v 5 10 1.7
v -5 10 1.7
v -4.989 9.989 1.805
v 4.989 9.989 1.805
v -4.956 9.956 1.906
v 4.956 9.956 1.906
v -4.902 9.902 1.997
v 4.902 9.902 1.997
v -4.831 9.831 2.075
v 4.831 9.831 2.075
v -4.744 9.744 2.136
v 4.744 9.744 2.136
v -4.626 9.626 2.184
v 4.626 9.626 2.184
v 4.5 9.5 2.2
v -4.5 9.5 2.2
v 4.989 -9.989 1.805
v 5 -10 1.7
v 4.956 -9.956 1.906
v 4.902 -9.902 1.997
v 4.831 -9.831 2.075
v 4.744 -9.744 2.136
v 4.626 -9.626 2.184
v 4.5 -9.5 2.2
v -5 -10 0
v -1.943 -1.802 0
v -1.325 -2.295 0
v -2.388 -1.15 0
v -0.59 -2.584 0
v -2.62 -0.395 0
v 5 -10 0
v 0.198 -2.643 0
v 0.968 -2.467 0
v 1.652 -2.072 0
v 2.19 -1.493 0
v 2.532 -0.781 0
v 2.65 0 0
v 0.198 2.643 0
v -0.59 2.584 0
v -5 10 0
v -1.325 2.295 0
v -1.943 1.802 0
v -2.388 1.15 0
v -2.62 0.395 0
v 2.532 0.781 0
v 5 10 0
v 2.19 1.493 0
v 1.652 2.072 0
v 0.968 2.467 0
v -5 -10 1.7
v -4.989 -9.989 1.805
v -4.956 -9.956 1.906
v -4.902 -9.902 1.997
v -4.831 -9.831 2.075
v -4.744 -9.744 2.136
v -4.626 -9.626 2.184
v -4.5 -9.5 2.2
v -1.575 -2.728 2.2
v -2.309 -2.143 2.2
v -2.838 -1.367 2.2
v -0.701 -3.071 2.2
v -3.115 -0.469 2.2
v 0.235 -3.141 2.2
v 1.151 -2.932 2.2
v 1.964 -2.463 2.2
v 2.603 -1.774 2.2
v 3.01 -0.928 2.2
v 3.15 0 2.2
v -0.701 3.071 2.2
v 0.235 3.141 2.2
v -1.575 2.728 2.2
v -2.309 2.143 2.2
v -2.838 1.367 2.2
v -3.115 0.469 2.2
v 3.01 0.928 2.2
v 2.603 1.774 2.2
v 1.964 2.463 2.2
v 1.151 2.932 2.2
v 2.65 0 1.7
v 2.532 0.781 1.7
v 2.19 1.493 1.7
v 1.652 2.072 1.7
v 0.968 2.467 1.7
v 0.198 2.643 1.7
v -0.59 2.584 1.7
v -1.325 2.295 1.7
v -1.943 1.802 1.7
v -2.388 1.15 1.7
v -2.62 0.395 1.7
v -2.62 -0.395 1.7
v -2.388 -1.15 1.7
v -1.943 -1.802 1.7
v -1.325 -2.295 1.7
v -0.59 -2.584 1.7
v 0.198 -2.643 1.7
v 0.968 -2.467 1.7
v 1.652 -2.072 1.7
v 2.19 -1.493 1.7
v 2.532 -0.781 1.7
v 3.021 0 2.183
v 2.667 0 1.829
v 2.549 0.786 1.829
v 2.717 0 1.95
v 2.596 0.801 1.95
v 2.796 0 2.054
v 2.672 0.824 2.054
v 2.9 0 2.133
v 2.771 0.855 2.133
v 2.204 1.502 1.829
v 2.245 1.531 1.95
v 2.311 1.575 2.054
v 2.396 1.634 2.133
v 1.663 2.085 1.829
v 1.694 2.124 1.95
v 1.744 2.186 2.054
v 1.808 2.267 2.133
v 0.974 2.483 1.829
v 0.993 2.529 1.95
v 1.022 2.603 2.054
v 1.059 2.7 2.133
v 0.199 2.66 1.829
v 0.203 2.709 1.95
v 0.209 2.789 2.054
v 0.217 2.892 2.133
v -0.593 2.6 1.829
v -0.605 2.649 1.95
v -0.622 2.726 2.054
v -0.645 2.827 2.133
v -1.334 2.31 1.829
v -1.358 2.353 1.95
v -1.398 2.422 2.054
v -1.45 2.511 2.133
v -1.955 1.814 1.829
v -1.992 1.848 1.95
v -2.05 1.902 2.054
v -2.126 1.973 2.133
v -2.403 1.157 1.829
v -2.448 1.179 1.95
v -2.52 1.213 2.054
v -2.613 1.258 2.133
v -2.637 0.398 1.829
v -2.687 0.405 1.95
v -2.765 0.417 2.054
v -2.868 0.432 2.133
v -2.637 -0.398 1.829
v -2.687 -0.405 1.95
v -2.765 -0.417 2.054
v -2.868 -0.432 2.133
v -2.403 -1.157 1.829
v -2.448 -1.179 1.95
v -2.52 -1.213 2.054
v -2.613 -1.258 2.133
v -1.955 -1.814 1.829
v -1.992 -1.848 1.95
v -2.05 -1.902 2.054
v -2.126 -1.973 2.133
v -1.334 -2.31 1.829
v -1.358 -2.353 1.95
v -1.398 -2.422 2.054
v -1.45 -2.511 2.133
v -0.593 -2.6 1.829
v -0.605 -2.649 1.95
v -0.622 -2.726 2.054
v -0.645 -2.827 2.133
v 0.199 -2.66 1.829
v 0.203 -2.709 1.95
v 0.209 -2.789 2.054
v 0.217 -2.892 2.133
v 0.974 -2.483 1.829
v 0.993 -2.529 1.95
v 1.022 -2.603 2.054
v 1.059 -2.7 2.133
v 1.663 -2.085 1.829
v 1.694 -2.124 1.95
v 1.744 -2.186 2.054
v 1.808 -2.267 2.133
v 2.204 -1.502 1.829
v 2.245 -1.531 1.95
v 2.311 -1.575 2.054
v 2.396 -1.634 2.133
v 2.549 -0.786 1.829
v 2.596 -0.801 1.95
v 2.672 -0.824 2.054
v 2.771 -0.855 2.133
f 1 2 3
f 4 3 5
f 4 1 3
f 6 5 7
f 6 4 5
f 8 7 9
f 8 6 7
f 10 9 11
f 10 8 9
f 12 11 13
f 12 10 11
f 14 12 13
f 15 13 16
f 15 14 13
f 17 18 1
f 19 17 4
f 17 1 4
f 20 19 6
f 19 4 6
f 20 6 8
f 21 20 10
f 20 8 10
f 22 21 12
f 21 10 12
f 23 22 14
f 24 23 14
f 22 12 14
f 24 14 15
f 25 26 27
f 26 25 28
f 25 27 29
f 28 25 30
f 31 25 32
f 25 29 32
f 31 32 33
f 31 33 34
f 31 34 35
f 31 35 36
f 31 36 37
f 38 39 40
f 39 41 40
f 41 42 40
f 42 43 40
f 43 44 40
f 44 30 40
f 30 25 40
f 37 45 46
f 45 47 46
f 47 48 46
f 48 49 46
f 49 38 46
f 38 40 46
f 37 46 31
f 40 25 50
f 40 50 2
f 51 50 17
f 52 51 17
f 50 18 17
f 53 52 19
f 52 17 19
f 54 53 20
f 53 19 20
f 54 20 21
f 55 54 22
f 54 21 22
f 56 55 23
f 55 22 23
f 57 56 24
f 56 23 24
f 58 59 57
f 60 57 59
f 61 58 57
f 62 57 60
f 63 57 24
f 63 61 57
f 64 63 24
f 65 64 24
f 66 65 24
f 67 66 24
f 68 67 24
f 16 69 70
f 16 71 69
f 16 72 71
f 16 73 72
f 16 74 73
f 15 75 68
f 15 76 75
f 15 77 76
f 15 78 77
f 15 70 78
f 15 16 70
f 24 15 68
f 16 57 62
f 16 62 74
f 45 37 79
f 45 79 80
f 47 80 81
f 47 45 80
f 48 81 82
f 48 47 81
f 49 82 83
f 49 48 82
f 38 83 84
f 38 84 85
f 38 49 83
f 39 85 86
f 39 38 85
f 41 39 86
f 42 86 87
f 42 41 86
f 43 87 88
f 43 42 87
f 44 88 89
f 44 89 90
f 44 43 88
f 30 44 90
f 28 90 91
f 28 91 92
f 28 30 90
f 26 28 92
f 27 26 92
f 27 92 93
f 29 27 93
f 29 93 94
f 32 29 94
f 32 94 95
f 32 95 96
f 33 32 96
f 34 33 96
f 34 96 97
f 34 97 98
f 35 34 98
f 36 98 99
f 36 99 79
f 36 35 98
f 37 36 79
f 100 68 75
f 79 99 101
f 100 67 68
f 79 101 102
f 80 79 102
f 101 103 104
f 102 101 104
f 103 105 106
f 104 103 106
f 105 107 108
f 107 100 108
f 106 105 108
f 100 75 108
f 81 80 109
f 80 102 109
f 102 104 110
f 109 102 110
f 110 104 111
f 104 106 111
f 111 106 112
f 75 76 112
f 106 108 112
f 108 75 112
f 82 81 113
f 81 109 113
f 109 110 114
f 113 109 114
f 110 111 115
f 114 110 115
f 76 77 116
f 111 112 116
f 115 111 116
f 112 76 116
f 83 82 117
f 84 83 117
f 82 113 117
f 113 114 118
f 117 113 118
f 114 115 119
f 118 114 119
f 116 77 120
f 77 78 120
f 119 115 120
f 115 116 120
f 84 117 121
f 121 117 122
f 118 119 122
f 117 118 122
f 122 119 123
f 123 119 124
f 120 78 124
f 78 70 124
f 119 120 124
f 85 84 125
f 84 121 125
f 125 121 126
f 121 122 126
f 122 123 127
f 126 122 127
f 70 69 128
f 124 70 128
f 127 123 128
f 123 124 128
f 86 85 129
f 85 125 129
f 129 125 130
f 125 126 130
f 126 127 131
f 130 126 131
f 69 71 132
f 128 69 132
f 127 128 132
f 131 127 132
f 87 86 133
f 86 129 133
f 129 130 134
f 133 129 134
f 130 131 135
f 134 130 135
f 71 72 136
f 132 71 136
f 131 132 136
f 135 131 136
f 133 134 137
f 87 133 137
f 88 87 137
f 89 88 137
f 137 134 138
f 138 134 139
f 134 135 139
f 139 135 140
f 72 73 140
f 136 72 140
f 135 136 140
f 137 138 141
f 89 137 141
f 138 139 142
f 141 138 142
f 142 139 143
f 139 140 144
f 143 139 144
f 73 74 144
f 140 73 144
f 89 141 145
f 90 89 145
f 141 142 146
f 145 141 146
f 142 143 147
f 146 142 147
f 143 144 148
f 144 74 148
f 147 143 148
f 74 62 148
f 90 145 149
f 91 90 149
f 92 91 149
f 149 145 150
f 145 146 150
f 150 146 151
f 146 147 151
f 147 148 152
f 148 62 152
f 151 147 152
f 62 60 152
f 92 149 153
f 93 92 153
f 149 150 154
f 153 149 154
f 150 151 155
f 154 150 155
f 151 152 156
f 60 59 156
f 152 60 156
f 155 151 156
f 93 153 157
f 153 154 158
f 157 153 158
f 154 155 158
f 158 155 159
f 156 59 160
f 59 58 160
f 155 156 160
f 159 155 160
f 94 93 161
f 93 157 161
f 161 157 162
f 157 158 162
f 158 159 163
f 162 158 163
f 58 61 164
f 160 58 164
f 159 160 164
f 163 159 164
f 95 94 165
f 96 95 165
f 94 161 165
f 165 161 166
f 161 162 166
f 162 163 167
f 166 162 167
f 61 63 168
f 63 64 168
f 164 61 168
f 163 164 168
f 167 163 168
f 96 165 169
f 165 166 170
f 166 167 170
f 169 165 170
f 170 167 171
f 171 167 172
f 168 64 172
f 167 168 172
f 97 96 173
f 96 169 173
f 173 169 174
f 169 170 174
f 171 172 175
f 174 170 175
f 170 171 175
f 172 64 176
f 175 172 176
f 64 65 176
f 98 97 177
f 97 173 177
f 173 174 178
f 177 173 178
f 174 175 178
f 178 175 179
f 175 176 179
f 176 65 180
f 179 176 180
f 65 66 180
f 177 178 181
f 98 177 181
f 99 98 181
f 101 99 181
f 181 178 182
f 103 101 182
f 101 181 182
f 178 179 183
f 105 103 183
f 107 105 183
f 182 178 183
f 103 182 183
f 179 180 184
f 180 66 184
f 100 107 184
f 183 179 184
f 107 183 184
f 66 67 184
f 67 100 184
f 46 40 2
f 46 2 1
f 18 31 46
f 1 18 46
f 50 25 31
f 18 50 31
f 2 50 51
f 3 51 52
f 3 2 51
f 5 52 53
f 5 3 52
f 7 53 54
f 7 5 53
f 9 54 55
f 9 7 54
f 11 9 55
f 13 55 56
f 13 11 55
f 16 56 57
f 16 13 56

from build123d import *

# Parameters (mm, degrees)
F0_W     = 10
F0_H     = 20
F0_R     = 2.65
F1_DEPTH = 2.2
F2_R     = 0.5


with BuildPart() as f1:
    # F0 (on Top) → F1 (new body)
    with BuildSketch(Plane.XY):
        Rectangle(F0_W, F0_H)
        Circle(F0_R, mode=Mode.SUBTRACT)
    extrude(amount=F1_DEPTH)

    # F2
    f2_edges = [f1.edges().sort_by_distance(p)[0] for p in [
        (-2.65, 0, 2.2),
        (5, 0, 2.2),
        (0, 10, 2.2),
        (0, -10, 2.2),
        (-5, 0, 2.2),
    ]]
    fillet(f2_edges, radius=F2_R)


solid = f1.part
